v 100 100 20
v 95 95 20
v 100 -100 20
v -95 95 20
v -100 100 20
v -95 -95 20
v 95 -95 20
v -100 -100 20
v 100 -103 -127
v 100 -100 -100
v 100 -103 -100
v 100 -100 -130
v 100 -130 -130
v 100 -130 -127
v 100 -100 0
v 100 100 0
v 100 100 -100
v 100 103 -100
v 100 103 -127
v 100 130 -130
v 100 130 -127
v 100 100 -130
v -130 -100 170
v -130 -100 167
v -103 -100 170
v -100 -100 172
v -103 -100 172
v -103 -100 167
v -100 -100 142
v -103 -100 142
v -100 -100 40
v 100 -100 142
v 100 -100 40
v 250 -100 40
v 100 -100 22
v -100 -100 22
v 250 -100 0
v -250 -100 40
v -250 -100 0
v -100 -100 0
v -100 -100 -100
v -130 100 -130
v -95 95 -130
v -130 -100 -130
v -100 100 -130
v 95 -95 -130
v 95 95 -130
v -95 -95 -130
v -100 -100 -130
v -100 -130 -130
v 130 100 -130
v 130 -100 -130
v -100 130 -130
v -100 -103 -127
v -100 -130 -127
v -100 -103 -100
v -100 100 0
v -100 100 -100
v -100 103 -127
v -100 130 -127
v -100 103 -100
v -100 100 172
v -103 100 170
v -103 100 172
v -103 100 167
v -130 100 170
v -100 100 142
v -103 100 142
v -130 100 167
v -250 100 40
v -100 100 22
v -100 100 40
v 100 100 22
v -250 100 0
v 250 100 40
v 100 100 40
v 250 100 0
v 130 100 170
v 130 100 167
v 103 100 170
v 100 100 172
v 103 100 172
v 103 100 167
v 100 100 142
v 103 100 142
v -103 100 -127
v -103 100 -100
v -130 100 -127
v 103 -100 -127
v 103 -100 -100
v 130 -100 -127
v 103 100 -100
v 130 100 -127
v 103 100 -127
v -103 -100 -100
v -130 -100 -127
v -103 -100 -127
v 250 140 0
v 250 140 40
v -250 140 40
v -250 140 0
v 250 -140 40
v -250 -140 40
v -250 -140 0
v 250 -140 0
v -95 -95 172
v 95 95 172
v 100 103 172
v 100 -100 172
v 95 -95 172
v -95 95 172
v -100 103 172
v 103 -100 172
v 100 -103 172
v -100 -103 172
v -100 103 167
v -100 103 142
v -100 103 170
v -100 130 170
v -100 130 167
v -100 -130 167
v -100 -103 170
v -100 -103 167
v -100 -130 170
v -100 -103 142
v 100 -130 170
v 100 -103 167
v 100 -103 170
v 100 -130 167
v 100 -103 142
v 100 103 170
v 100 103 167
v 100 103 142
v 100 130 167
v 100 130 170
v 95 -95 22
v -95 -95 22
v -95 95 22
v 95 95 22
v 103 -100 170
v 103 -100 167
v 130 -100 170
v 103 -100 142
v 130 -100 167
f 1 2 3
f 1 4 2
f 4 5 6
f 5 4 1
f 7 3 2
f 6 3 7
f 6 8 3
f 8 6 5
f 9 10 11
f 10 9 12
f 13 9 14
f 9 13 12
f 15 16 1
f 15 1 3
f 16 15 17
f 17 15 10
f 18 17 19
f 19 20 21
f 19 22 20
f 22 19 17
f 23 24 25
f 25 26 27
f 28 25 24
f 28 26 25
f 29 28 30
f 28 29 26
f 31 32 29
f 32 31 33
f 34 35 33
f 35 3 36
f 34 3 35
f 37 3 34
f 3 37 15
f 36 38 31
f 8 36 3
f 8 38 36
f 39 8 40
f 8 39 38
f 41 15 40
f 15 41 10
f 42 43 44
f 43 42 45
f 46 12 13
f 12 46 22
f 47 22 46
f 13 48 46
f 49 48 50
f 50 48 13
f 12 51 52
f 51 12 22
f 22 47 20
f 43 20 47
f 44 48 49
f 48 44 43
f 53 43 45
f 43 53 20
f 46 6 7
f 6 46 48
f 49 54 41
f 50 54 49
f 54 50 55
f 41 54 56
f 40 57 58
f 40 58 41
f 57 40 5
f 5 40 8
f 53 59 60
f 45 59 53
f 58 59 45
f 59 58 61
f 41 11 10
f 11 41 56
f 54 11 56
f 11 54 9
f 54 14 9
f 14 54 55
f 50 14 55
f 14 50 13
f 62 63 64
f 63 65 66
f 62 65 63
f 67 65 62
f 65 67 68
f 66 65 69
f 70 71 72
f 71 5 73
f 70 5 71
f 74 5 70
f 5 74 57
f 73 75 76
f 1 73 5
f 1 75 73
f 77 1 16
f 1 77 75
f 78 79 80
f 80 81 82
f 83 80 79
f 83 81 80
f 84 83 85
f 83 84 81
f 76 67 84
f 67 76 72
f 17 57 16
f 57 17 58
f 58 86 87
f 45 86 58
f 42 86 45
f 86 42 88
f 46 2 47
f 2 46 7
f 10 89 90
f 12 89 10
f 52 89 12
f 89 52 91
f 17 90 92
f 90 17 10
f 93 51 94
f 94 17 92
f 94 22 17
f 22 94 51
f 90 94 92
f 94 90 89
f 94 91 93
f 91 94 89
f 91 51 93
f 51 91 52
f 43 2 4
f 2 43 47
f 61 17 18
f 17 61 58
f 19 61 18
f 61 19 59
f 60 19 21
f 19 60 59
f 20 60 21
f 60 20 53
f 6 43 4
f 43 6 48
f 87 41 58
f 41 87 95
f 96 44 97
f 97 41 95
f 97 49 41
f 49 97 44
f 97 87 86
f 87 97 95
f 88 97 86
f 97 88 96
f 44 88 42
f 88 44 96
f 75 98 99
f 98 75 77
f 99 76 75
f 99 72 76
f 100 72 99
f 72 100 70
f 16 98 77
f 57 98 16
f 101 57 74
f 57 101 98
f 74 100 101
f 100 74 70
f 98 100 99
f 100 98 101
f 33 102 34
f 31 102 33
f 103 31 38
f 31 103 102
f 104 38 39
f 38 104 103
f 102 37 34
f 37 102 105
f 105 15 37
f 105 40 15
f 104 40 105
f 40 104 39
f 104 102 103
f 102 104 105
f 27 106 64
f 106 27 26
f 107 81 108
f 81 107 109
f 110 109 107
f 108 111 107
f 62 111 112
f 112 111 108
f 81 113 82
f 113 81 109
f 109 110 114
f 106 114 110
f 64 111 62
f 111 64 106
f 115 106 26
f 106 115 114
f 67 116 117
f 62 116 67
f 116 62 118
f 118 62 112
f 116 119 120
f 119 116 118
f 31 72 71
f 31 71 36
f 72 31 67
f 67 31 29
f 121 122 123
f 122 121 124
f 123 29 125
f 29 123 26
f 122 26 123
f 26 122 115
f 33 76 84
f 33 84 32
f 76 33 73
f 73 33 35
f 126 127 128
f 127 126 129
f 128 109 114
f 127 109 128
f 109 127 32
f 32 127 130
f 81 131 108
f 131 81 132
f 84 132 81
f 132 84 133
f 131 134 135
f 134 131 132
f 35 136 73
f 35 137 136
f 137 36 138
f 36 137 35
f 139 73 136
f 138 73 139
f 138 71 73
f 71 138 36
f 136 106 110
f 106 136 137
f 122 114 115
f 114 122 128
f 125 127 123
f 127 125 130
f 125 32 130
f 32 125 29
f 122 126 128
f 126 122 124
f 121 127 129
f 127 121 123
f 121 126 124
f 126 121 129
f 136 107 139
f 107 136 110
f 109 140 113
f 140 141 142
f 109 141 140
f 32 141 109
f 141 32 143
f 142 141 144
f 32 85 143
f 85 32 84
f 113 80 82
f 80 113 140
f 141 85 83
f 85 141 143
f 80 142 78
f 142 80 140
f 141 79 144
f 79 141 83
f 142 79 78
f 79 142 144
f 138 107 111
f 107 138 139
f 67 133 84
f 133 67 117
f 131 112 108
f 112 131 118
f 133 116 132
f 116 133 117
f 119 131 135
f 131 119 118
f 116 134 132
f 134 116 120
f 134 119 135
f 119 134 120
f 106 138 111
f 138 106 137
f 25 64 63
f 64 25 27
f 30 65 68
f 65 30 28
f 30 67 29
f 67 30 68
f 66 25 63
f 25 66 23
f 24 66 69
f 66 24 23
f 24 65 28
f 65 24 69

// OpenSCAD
l = 200;
lg = 200;

h1 = 150;
h2 = 150;

z1 = 20-h1;
z2 = 22;


for(i = [-180,-90,0,90]){
    rotate([0,0,i]) translate([-l/2, lg/2-5, z1]) cube([l, 5, h1]);
    
    rotate([0,0,i]) translate([-l/2, lg/2, z1]) cube([l, 3, 30]);
    rotate([0,0,i]) translate([-l/2, lg/2, z1]) cube([l, 30, 3]);
}

for(i = [0,180,0]){
    rotate([0,0,i]) translate([-250, lg/2, 0]) cube([500, 40, 40]);
    
}

for(i = [-180,-90,0,90]){
    rotate([0,0,i]) translate([-l/2, lg/2-5, z2]) cube([l, 5, h2]);
    
    rotate([0,0,i]) translate([-l/2, lg/2, z2+h2-30]) cube([l, 3, 30]);
    rotate([0,0,i]) translate([-l/2, lg/2, z2+h2-5]) cube([l, 30, 3]);
}

%difference(){
    translate([-500, -500, -90])cube([1000,1000,90]);
    cube([270,270,1000], center = true);
}
